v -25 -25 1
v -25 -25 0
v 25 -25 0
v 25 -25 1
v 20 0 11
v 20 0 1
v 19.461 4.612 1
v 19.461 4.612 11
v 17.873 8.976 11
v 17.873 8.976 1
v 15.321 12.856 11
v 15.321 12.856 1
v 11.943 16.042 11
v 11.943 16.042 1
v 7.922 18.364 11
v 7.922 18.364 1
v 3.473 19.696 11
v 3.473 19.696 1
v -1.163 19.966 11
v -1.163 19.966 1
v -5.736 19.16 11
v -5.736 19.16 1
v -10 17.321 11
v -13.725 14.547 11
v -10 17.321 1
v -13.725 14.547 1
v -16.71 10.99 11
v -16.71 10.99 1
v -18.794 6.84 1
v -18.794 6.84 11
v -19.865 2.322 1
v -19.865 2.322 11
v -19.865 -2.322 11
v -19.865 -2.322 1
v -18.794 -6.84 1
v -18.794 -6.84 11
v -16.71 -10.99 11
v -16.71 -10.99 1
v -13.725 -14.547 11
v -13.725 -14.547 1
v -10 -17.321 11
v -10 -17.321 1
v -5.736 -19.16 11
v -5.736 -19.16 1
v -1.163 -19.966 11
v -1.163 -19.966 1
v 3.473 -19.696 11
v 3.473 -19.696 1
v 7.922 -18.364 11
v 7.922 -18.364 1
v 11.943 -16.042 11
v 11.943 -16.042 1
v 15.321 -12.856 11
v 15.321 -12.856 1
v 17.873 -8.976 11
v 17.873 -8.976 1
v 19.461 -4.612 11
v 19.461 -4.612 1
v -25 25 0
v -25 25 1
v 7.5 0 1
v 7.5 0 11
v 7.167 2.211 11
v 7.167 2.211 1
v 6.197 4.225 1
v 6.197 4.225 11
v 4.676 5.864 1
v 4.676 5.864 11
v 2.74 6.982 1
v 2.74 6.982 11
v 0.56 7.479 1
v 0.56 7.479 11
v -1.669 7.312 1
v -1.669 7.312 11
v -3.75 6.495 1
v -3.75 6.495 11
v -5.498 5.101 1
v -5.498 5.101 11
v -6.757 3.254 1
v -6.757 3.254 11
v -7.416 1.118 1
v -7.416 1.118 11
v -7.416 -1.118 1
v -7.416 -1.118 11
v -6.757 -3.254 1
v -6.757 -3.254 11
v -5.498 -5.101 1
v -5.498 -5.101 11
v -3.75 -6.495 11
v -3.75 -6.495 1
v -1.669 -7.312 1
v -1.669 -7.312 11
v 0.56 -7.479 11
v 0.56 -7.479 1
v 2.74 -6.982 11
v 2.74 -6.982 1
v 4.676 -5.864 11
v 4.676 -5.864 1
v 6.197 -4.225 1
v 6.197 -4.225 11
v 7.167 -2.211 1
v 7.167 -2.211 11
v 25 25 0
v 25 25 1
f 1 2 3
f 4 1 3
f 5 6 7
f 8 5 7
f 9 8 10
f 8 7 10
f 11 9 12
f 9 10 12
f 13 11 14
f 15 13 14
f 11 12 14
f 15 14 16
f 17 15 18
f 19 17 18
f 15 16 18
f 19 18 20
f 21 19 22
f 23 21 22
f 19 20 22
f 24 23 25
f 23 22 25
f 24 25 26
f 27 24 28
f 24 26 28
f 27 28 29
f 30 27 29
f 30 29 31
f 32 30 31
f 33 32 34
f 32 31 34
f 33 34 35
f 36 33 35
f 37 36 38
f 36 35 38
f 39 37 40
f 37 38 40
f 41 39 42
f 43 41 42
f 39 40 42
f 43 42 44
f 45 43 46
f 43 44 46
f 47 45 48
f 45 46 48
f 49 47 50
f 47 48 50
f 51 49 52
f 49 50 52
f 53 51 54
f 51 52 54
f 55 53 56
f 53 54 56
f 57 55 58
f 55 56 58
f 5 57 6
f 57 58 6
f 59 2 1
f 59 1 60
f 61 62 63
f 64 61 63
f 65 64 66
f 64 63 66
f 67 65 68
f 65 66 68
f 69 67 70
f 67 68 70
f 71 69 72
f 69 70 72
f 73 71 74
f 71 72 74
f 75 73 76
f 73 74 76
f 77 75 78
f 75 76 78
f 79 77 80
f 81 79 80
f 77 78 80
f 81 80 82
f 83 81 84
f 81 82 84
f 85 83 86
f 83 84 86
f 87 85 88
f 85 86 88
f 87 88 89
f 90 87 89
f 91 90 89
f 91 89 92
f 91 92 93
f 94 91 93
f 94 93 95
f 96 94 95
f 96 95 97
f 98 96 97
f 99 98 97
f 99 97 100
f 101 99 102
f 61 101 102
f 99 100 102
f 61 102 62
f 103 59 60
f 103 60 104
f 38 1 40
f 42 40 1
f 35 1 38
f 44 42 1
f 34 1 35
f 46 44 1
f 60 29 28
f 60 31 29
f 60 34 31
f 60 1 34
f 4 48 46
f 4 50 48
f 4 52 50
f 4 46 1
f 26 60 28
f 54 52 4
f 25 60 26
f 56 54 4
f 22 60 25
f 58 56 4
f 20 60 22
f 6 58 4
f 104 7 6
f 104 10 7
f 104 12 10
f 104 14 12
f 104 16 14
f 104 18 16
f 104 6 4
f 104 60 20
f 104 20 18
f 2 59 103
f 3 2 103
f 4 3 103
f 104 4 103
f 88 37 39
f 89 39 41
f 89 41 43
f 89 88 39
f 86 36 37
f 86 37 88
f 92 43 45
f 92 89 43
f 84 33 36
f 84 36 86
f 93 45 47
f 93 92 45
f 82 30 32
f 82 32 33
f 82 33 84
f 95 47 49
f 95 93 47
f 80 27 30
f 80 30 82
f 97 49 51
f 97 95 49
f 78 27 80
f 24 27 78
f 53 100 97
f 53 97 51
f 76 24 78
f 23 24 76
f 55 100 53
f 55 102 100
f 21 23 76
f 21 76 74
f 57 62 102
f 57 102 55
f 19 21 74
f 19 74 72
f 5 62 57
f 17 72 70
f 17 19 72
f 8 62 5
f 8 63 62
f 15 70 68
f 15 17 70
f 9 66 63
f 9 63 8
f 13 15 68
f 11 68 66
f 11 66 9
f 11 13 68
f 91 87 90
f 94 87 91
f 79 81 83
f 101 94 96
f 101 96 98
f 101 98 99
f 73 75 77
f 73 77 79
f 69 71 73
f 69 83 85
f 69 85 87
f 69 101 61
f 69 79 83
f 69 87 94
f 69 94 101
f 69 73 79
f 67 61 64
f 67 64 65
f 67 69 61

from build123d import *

# Parameters (mm, degrees)
F0_W     = 50
F0_H     = 50
F1_DEPTH = 1
F2_R     = 20
F3_DEPTH = 10
F4_R     = 7.5
F5_DEPTH = 10


with BuildPart() as f1:
    # F0 (on Top) → F1 (new body)
    with BuildSketch(Plane.XY):
        Rectangle(F0_W, F0_H)
    extrude(amount=F1_DEPTH)

    # F2 (on face) → F3 (join)
    with BuildSketch(Plane.XY.offset(1)):
        Circle(F2_R)
    extrude(amount=F3_DEPTH)

    # F4 (on face) → F5 (cut)
    with BuildSketch(Plane.XY.offset(11)):
        Circle(F4_R)
    extrude(amount=-F5_DEPTH, mode=Mode.SUBTRACT)


solid = f1.part
